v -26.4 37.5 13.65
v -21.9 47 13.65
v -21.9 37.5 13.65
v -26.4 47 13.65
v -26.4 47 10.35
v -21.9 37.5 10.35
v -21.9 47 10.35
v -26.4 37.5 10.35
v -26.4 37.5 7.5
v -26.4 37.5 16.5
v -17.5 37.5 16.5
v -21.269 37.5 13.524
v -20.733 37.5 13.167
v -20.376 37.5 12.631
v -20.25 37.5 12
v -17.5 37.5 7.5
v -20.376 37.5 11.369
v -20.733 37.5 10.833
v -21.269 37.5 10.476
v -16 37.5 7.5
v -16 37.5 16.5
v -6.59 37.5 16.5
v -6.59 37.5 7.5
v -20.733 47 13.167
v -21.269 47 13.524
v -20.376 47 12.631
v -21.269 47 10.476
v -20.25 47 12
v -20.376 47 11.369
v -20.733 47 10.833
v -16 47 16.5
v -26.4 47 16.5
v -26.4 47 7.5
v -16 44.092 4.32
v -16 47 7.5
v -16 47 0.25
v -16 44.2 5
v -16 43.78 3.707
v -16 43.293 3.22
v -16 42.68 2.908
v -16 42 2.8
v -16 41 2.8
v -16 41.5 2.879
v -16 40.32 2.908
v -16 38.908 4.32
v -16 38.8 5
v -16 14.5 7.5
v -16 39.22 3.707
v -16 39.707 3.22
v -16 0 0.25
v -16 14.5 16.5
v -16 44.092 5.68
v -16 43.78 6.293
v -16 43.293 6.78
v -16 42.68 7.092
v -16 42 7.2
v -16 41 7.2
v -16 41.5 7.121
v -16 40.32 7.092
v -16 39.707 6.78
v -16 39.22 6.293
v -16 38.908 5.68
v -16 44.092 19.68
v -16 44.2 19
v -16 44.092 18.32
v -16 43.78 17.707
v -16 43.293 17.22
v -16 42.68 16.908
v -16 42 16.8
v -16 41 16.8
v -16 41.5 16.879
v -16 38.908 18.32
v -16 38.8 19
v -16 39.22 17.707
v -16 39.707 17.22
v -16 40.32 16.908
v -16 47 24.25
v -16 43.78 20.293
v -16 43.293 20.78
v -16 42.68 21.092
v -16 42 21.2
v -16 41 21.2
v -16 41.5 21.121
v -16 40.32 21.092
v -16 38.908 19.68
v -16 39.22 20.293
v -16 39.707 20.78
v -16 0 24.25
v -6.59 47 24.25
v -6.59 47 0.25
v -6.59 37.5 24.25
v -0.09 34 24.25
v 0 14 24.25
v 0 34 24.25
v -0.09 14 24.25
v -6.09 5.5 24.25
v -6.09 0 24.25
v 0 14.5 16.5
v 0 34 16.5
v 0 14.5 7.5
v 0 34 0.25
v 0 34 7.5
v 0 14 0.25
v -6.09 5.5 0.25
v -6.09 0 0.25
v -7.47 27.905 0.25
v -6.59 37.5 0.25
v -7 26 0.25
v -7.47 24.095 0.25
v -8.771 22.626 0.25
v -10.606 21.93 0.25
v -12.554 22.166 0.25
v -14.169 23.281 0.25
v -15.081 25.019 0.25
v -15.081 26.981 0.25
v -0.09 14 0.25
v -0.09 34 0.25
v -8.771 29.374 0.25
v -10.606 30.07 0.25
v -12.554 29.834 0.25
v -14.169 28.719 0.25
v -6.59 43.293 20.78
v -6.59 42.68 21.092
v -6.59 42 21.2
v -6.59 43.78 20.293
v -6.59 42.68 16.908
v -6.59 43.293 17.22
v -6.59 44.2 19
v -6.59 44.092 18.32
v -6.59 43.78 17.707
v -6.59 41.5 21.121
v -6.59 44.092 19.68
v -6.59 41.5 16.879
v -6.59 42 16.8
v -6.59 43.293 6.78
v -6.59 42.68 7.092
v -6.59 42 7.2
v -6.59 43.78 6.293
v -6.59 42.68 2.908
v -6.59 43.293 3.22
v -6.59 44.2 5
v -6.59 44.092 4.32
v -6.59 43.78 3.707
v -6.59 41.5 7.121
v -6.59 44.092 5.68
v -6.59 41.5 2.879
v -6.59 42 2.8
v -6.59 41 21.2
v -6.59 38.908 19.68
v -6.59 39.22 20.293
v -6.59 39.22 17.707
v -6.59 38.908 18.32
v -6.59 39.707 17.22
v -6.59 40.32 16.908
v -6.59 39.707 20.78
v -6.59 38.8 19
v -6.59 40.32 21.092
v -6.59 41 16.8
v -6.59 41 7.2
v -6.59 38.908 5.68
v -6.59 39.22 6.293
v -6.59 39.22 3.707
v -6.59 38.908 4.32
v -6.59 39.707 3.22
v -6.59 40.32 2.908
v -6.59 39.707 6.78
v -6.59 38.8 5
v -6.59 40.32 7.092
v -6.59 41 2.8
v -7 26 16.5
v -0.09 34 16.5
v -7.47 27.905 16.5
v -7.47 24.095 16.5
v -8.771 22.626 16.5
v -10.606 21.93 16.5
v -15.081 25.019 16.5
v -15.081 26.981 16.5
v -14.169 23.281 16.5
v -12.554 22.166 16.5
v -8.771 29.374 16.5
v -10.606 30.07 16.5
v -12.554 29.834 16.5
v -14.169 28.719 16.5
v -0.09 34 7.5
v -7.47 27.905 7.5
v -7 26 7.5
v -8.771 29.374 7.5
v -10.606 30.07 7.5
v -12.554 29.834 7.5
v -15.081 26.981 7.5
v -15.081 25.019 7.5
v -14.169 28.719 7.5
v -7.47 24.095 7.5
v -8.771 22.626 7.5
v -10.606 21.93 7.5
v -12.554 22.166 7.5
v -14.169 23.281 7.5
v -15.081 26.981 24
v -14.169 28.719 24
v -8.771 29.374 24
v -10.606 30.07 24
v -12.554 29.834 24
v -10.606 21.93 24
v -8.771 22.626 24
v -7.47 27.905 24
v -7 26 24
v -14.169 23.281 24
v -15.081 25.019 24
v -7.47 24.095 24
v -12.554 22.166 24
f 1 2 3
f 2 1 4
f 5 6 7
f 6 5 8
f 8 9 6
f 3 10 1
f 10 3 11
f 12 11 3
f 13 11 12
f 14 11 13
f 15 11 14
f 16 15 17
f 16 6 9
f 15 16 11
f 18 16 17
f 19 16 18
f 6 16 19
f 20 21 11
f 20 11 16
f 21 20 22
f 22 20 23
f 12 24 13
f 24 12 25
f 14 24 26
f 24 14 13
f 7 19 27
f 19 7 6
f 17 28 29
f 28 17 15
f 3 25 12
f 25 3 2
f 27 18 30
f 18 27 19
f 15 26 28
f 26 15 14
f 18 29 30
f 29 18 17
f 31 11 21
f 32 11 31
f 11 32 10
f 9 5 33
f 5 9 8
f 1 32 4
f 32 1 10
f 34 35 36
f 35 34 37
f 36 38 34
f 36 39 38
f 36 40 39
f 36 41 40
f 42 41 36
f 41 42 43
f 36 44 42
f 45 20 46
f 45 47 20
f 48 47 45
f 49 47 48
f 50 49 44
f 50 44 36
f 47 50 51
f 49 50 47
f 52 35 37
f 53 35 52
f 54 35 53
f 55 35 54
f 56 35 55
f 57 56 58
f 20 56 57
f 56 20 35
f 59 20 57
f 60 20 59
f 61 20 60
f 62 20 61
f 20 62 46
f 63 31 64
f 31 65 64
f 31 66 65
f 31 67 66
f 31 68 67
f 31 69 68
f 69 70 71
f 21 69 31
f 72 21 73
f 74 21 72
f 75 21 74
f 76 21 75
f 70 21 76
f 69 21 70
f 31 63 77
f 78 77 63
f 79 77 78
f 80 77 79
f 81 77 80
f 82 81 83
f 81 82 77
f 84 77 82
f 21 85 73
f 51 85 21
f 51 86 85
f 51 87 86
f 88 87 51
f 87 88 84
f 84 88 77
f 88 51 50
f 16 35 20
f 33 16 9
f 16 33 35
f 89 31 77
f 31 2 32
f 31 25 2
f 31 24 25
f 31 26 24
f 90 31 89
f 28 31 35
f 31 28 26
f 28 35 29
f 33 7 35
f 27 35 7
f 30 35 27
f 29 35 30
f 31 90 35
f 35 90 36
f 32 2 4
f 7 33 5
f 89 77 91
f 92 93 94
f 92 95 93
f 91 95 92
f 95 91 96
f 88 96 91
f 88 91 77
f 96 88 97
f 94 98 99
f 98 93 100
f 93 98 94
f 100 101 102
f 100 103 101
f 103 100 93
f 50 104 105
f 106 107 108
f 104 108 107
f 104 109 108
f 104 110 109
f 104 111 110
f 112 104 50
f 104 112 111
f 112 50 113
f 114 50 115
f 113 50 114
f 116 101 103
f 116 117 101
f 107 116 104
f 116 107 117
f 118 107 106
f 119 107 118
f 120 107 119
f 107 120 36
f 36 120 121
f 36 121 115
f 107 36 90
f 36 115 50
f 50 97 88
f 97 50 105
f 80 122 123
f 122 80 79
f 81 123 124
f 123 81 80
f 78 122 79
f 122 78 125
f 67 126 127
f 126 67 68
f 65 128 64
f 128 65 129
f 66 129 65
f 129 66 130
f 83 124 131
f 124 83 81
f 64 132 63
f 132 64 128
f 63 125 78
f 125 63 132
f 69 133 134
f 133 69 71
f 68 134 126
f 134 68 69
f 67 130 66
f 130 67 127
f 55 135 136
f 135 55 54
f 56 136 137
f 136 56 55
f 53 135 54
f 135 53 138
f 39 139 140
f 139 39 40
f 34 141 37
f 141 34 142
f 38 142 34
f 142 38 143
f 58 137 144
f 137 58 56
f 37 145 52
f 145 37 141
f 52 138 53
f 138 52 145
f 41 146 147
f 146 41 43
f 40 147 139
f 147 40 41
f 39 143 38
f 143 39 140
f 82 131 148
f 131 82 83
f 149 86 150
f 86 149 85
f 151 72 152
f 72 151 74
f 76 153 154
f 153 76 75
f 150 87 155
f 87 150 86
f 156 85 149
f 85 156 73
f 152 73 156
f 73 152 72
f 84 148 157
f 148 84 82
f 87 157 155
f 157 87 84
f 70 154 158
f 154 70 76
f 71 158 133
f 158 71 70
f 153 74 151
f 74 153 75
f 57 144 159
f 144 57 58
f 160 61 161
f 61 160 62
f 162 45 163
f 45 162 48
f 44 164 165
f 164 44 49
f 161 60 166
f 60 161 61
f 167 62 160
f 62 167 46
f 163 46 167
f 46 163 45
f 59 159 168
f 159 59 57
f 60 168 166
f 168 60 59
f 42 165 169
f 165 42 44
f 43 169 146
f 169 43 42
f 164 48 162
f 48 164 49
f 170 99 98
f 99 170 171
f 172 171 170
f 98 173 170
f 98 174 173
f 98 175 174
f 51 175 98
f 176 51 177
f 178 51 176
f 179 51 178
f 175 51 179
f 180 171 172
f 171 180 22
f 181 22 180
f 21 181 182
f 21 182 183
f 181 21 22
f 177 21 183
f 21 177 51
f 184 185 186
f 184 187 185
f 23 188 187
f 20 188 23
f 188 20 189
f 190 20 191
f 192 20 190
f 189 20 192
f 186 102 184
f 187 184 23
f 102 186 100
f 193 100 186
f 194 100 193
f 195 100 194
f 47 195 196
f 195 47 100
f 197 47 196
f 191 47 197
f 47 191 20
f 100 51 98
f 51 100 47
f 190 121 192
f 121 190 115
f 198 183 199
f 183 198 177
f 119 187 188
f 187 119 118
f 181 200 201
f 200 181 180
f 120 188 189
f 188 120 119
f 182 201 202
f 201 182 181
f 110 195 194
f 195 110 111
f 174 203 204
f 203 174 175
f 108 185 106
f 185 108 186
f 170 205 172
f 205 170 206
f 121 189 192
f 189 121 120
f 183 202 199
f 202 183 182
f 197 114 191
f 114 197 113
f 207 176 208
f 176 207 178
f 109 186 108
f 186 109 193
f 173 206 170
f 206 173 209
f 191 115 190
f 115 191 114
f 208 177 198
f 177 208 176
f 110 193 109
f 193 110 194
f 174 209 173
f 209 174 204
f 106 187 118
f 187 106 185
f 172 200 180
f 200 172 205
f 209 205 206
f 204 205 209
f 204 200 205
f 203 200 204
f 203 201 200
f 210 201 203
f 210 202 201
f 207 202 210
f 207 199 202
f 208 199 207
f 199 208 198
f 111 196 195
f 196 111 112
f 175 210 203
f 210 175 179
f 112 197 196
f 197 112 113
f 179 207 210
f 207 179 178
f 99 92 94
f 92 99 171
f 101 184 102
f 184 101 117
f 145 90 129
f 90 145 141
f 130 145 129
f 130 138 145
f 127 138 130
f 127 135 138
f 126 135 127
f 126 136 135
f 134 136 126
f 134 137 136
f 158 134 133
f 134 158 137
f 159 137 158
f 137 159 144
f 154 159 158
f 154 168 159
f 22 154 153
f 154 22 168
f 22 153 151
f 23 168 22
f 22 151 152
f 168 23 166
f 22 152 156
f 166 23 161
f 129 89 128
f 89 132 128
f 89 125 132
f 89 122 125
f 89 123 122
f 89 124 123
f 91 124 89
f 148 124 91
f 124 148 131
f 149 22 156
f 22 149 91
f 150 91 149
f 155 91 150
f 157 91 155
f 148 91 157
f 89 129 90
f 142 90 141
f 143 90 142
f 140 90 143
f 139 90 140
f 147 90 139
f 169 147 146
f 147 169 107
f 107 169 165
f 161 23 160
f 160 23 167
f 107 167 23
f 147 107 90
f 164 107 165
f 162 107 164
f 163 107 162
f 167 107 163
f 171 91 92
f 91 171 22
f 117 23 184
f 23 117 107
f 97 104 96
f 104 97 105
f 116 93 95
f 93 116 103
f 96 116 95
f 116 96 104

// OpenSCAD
// file: extruderConfig.scad
extraHeight = 5;   //So the large gear clears the cooling fan duct
screwTrapAdj = 5;  //Move these away from the idler to make the hobbed pulley accessable 
// main file
// PRUSA iteration3
// NEMA 17 extruder idler
// GNU GPL v3
// Josef Průša <iam@josefprusa.cz> and contributors
// http://www.reprap.org/wiki/Prusa_Mendel
// http://prusamendel.org

include<extruderConfig.scad>


extraThickness = 5;
filaSlotWidth = 3.3;
ballBearingDia = 22; //608zz
bearingRodDia = 8;   //M8 grub screw (25mm)
filaSlotLen = 4.5;
standVerticalAdj = 1;  //thin the bottom so it stands vertical when clamping the filament
bearingRodCenterToInnerSurface = 4.1+3-2;
guideLen = ballBearingDia/2-bearingRodCenterToInnerSurface+filaSlotLen;//14;
echo(guideLen);
blockMaxThickness = bearingRodDia+3+extraThickness;

module extruder_idler_base(){
 translate([0.25,0,0])
	{ 
	cube([24,42+extraHeight,blockMaxThickness]);
	translate([(24-9)/2-0.25,42+extraHeight-9.5,blockMaxThickness])
		{
		difference()
			{
			cube([9,9.5,guideLen]);
			translate([(9-filaSlotWidth)/2,0,guideLen-filaSlotLen])
				{
				cube([filaSlotWidth,10,filaSlotLen]);
				translate([filaSlotWidth/2,10,0])
					rotate([90,0,0])
					cylinder(d = filaSlotWidth,h=10,$fn = 16);
				}	
			}
		}
	}

}

module extruder_idler_holes(){
 translate([12,21,extraThickness]){
  // Main cutout
  cube([11-2,23,25], center= true);
  // Idler shaft
  translate([-12,0,4.1+2])rotate([0,90,0])cylinder(r=4.1, h=24);
  // Screw holes
  //translate([7,-16,-1])cylinder(r=2.2, h=24);
  //translate([-7,-16,-1])cylinder(r=2.2, h=24);
translate([0,0,-extraThickness])
	{
  	translate([7,16,-1])cylinder(r=2.2, h=24+extraThickness, $fn=20);
  	translate([-7,16,-1])cylinder(r=2.2, h=24+extraThickness, $fn=20);

	translate([7,15,-1])cylinder(r=2.2, h=24+extraThickness, $fn=20);
   translate([-7,15,-1])cylinder(r=2.2, h=24+extraThickness, $fn=20);
	}
 }

//top cutout
translate([-0.5,29,-0.01])
	{
	hull()
		{
		cube([25,20,0.1]);	
		translate([0,3.5,extraThickness+screwTrapAdj-3.5])
	   	cube([25,20,0.1]);
		}	
	}


//bottom cutout
translate([-0.5,-extraHeight,-0.01])
	{
	hull()
		{
		cube([25,9+extraHeight,0.1]);	
		translate([0,-3.5,extraThickness+standVerticalAdj])
	   	cube([25,9,0.1]);
		}	
	}
}



// Idler final part
module idler(){
 difference(){
  extruder_idler_base();
	translate([0,extraHeight,0])
     extruder_idler_holes();
 }
}

rotate([0,-90,0])
	idler();
